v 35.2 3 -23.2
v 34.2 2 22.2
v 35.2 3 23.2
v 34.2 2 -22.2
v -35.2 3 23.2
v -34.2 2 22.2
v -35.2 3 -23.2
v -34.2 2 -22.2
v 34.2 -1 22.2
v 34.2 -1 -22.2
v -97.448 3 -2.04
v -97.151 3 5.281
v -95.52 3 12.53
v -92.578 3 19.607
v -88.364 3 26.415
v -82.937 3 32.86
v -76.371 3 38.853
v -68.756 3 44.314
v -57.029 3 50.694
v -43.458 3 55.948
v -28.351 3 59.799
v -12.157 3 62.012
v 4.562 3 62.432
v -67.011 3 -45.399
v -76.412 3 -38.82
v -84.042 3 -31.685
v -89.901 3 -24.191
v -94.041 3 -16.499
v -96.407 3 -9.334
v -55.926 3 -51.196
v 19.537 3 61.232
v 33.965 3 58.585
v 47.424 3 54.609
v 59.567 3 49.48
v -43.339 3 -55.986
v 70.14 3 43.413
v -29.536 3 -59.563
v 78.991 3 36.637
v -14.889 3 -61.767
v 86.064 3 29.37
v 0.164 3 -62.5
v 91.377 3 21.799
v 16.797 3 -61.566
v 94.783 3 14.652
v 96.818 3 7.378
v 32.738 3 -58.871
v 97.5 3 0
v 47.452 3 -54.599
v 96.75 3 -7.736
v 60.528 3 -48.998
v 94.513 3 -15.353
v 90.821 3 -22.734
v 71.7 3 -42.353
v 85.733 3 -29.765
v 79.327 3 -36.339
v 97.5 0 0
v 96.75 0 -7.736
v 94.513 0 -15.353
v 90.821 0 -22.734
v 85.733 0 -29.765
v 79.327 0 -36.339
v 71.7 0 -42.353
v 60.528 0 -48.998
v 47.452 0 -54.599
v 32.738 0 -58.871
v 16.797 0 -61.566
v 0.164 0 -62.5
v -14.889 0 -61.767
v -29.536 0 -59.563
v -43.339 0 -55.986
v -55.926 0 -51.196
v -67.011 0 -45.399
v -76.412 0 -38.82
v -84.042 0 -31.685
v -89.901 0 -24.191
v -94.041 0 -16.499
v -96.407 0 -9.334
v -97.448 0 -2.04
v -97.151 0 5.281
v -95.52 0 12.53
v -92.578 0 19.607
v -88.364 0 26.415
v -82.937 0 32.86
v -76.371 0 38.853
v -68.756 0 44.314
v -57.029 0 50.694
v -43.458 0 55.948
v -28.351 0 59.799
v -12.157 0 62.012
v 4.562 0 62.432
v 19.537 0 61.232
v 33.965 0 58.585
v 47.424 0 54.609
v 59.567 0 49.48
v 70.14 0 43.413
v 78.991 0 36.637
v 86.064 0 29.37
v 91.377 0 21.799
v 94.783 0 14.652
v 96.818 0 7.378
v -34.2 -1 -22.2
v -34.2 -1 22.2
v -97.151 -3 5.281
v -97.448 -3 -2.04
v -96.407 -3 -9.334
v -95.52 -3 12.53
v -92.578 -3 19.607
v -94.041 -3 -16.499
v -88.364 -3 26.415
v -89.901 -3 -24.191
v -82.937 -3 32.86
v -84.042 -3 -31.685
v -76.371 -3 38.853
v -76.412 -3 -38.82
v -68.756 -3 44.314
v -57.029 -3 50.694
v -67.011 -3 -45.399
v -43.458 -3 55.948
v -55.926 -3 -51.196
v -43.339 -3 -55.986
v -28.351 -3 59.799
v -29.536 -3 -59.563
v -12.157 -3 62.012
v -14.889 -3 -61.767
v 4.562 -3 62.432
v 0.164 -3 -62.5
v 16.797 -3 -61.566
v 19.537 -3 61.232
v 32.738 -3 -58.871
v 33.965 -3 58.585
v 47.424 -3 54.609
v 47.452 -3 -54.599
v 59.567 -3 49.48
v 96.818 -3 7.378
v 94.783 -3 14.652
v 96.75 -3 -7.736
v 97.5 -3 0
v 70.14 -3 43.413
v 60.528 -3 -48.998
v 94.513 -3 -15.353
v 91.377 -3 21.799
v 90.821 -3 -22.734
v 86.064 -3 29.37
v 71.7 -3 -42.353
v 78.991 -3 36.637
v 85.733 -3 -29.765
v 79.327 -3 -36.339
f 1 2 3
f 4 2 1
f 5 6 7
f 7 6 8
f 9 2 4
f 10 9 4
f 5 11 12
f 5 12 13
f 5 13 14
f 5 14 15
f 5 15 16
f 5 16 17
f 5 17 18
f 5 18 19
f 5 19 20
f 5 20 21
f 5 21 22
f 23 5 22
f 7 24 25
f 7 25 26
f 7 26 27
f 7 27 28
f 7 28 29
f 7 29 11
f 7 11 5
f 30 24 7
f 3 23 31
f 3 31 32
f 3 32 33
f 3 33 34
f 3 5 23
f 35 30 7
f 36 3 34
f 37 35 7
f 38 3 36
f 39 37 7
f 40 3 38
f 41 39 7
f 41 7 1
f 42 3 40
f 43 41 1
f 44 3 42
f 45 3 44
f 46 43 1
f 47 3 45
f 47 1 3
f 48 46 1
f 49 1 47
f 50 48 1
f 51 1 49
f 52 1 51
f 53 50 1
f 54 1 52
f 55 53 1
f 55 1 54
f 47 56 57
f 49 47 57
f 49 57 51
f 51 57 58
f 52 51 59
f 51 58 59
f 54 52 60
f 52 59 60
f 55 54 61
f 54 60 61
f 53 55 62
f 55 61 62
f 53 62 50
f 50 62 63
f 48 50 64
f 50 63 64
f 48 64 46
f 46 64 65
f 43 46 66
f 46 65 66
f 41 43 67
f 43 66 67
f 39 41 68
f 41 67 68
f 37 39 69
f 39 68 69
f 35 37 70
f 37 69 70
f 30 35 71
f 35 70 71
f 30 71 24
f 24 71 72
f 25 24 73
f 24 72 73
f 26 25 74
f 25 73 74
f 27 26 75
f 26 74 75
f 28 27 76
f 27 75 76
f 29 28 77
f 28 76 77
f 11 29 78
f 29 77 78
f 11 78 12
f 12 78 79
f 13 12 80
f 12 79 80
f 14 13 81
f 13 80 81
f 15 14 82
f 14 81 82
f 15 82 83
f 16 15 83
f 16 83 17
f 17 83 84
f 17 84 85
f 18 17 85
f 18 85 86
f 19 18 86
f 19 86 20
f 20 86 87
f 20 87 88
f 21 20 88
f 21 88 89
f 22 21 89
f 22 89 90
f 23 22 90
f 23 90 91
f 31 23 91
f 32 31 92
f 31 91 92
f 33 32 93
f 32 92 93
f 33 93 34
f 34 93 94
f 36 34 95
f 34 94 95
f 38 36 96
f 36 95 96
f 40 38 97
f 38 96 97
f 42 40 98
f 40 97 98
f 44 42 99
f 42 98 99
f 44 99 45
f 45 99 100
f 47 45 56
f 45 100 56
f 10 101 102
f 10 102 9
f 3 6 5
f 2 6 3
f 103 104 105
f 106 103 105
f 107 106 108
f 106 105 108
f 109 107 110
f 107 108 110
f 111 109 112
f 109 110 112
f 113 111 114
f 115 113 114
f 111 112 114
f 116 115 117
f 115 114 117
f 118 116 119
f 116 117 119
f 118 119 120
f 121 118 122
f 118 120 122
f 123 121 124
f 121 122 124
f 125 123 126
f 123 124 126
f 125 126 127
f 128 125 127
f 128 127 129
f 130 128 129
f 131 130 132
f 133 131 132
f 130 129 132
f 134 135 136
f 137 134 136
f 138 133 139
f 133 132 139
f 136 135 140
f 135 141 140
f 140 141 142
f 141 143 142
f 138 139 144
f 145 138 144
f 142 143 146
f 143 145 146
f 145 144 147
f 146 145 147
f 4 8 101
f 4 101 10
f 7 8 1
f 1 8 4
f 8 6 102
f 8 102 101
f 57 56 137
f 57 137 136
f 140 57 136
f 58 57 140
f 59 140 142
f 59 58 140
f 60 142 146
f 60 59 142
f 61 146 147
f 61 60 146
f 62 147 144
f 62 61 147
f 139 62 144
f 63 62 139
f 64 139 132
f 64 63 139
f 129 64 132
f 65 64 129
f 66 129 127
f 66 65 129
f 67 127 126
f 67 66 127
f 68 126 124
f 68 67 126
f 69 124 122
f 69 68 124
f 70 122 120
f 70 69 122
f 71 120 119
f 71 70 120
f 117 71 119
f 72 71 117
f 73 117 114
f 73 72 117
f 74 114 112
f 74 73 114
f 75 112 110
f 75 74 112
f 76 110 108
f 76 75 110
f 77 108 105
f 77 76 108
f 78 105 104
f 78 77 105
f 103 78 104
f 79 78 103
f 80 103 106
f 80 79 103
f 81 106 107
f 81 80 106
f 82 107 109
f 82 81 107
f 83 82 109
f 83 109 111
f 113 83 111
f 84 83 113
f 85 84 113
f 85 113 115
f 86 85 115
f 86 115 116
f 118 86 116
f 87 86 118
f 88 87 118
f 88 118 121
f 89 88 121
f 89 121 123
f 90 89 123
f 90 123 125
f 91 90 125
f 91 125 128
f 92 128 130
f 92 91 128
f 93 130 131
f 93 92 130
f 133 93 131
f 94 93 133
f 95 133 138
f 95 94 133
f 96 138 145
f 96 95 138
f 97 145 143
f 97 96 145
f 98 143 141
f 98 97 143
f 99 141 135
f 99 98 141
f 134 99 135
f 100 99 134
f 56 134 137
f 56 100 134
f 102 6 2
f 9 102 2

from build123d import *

# Parameters (mm, degrees)
SKETCH2_RX          = 97.5
SKETCH2_RY          = 62.5
BOSS_EXTRUDE1_DEPTH = 3
SKETCH3_W           = 68.4
SKETCH3_H           = 44.4
CUT_EXTRUDE1_DEPTH  = 4
CHAMFER2_SIZE       = 1


with BuildPart() as part:
    # Sketch2 → Boss-Extrude1 (new, symmetric)
    with BuildSketch(Plane(origin=(0, 0, 0), x_dir=(1, 0, 0), z_dir=(0, 1, 0))):
        with Locations((0, 0)):
            Ellipse(SKETCH2_RX, SKETCH2_RY)
    extrude(amount=BOSS_EXTRUDE1_DEPTH, both=True)

    # Sketch3 → Cut-Extrude1 (cut)
    with BuildSketch(Plane(origin=(0, 3, 0), x_dir=(1, 0, 0), z_dir=(0, 1, 0))):
        Rectangle(SKETCH3_W, SKETCH3_H)
    extrude(amount=-CUT_EXTRUDE1_DEPTH, mode=Mode.SUBTRACT)

    # Chamfer2
    chamfer2_edges = [part.edges().sort_by_distance(p)[0] for p in [
        (0, 3, 22.2),
        (34.2, 3, 0),
        (0, 3, -22.2),
        (-34.2, 3, 0),
    ]]
    chamfer(chamfer2_edges, length=CHAMFER2_SIZE)


solid = part.part
